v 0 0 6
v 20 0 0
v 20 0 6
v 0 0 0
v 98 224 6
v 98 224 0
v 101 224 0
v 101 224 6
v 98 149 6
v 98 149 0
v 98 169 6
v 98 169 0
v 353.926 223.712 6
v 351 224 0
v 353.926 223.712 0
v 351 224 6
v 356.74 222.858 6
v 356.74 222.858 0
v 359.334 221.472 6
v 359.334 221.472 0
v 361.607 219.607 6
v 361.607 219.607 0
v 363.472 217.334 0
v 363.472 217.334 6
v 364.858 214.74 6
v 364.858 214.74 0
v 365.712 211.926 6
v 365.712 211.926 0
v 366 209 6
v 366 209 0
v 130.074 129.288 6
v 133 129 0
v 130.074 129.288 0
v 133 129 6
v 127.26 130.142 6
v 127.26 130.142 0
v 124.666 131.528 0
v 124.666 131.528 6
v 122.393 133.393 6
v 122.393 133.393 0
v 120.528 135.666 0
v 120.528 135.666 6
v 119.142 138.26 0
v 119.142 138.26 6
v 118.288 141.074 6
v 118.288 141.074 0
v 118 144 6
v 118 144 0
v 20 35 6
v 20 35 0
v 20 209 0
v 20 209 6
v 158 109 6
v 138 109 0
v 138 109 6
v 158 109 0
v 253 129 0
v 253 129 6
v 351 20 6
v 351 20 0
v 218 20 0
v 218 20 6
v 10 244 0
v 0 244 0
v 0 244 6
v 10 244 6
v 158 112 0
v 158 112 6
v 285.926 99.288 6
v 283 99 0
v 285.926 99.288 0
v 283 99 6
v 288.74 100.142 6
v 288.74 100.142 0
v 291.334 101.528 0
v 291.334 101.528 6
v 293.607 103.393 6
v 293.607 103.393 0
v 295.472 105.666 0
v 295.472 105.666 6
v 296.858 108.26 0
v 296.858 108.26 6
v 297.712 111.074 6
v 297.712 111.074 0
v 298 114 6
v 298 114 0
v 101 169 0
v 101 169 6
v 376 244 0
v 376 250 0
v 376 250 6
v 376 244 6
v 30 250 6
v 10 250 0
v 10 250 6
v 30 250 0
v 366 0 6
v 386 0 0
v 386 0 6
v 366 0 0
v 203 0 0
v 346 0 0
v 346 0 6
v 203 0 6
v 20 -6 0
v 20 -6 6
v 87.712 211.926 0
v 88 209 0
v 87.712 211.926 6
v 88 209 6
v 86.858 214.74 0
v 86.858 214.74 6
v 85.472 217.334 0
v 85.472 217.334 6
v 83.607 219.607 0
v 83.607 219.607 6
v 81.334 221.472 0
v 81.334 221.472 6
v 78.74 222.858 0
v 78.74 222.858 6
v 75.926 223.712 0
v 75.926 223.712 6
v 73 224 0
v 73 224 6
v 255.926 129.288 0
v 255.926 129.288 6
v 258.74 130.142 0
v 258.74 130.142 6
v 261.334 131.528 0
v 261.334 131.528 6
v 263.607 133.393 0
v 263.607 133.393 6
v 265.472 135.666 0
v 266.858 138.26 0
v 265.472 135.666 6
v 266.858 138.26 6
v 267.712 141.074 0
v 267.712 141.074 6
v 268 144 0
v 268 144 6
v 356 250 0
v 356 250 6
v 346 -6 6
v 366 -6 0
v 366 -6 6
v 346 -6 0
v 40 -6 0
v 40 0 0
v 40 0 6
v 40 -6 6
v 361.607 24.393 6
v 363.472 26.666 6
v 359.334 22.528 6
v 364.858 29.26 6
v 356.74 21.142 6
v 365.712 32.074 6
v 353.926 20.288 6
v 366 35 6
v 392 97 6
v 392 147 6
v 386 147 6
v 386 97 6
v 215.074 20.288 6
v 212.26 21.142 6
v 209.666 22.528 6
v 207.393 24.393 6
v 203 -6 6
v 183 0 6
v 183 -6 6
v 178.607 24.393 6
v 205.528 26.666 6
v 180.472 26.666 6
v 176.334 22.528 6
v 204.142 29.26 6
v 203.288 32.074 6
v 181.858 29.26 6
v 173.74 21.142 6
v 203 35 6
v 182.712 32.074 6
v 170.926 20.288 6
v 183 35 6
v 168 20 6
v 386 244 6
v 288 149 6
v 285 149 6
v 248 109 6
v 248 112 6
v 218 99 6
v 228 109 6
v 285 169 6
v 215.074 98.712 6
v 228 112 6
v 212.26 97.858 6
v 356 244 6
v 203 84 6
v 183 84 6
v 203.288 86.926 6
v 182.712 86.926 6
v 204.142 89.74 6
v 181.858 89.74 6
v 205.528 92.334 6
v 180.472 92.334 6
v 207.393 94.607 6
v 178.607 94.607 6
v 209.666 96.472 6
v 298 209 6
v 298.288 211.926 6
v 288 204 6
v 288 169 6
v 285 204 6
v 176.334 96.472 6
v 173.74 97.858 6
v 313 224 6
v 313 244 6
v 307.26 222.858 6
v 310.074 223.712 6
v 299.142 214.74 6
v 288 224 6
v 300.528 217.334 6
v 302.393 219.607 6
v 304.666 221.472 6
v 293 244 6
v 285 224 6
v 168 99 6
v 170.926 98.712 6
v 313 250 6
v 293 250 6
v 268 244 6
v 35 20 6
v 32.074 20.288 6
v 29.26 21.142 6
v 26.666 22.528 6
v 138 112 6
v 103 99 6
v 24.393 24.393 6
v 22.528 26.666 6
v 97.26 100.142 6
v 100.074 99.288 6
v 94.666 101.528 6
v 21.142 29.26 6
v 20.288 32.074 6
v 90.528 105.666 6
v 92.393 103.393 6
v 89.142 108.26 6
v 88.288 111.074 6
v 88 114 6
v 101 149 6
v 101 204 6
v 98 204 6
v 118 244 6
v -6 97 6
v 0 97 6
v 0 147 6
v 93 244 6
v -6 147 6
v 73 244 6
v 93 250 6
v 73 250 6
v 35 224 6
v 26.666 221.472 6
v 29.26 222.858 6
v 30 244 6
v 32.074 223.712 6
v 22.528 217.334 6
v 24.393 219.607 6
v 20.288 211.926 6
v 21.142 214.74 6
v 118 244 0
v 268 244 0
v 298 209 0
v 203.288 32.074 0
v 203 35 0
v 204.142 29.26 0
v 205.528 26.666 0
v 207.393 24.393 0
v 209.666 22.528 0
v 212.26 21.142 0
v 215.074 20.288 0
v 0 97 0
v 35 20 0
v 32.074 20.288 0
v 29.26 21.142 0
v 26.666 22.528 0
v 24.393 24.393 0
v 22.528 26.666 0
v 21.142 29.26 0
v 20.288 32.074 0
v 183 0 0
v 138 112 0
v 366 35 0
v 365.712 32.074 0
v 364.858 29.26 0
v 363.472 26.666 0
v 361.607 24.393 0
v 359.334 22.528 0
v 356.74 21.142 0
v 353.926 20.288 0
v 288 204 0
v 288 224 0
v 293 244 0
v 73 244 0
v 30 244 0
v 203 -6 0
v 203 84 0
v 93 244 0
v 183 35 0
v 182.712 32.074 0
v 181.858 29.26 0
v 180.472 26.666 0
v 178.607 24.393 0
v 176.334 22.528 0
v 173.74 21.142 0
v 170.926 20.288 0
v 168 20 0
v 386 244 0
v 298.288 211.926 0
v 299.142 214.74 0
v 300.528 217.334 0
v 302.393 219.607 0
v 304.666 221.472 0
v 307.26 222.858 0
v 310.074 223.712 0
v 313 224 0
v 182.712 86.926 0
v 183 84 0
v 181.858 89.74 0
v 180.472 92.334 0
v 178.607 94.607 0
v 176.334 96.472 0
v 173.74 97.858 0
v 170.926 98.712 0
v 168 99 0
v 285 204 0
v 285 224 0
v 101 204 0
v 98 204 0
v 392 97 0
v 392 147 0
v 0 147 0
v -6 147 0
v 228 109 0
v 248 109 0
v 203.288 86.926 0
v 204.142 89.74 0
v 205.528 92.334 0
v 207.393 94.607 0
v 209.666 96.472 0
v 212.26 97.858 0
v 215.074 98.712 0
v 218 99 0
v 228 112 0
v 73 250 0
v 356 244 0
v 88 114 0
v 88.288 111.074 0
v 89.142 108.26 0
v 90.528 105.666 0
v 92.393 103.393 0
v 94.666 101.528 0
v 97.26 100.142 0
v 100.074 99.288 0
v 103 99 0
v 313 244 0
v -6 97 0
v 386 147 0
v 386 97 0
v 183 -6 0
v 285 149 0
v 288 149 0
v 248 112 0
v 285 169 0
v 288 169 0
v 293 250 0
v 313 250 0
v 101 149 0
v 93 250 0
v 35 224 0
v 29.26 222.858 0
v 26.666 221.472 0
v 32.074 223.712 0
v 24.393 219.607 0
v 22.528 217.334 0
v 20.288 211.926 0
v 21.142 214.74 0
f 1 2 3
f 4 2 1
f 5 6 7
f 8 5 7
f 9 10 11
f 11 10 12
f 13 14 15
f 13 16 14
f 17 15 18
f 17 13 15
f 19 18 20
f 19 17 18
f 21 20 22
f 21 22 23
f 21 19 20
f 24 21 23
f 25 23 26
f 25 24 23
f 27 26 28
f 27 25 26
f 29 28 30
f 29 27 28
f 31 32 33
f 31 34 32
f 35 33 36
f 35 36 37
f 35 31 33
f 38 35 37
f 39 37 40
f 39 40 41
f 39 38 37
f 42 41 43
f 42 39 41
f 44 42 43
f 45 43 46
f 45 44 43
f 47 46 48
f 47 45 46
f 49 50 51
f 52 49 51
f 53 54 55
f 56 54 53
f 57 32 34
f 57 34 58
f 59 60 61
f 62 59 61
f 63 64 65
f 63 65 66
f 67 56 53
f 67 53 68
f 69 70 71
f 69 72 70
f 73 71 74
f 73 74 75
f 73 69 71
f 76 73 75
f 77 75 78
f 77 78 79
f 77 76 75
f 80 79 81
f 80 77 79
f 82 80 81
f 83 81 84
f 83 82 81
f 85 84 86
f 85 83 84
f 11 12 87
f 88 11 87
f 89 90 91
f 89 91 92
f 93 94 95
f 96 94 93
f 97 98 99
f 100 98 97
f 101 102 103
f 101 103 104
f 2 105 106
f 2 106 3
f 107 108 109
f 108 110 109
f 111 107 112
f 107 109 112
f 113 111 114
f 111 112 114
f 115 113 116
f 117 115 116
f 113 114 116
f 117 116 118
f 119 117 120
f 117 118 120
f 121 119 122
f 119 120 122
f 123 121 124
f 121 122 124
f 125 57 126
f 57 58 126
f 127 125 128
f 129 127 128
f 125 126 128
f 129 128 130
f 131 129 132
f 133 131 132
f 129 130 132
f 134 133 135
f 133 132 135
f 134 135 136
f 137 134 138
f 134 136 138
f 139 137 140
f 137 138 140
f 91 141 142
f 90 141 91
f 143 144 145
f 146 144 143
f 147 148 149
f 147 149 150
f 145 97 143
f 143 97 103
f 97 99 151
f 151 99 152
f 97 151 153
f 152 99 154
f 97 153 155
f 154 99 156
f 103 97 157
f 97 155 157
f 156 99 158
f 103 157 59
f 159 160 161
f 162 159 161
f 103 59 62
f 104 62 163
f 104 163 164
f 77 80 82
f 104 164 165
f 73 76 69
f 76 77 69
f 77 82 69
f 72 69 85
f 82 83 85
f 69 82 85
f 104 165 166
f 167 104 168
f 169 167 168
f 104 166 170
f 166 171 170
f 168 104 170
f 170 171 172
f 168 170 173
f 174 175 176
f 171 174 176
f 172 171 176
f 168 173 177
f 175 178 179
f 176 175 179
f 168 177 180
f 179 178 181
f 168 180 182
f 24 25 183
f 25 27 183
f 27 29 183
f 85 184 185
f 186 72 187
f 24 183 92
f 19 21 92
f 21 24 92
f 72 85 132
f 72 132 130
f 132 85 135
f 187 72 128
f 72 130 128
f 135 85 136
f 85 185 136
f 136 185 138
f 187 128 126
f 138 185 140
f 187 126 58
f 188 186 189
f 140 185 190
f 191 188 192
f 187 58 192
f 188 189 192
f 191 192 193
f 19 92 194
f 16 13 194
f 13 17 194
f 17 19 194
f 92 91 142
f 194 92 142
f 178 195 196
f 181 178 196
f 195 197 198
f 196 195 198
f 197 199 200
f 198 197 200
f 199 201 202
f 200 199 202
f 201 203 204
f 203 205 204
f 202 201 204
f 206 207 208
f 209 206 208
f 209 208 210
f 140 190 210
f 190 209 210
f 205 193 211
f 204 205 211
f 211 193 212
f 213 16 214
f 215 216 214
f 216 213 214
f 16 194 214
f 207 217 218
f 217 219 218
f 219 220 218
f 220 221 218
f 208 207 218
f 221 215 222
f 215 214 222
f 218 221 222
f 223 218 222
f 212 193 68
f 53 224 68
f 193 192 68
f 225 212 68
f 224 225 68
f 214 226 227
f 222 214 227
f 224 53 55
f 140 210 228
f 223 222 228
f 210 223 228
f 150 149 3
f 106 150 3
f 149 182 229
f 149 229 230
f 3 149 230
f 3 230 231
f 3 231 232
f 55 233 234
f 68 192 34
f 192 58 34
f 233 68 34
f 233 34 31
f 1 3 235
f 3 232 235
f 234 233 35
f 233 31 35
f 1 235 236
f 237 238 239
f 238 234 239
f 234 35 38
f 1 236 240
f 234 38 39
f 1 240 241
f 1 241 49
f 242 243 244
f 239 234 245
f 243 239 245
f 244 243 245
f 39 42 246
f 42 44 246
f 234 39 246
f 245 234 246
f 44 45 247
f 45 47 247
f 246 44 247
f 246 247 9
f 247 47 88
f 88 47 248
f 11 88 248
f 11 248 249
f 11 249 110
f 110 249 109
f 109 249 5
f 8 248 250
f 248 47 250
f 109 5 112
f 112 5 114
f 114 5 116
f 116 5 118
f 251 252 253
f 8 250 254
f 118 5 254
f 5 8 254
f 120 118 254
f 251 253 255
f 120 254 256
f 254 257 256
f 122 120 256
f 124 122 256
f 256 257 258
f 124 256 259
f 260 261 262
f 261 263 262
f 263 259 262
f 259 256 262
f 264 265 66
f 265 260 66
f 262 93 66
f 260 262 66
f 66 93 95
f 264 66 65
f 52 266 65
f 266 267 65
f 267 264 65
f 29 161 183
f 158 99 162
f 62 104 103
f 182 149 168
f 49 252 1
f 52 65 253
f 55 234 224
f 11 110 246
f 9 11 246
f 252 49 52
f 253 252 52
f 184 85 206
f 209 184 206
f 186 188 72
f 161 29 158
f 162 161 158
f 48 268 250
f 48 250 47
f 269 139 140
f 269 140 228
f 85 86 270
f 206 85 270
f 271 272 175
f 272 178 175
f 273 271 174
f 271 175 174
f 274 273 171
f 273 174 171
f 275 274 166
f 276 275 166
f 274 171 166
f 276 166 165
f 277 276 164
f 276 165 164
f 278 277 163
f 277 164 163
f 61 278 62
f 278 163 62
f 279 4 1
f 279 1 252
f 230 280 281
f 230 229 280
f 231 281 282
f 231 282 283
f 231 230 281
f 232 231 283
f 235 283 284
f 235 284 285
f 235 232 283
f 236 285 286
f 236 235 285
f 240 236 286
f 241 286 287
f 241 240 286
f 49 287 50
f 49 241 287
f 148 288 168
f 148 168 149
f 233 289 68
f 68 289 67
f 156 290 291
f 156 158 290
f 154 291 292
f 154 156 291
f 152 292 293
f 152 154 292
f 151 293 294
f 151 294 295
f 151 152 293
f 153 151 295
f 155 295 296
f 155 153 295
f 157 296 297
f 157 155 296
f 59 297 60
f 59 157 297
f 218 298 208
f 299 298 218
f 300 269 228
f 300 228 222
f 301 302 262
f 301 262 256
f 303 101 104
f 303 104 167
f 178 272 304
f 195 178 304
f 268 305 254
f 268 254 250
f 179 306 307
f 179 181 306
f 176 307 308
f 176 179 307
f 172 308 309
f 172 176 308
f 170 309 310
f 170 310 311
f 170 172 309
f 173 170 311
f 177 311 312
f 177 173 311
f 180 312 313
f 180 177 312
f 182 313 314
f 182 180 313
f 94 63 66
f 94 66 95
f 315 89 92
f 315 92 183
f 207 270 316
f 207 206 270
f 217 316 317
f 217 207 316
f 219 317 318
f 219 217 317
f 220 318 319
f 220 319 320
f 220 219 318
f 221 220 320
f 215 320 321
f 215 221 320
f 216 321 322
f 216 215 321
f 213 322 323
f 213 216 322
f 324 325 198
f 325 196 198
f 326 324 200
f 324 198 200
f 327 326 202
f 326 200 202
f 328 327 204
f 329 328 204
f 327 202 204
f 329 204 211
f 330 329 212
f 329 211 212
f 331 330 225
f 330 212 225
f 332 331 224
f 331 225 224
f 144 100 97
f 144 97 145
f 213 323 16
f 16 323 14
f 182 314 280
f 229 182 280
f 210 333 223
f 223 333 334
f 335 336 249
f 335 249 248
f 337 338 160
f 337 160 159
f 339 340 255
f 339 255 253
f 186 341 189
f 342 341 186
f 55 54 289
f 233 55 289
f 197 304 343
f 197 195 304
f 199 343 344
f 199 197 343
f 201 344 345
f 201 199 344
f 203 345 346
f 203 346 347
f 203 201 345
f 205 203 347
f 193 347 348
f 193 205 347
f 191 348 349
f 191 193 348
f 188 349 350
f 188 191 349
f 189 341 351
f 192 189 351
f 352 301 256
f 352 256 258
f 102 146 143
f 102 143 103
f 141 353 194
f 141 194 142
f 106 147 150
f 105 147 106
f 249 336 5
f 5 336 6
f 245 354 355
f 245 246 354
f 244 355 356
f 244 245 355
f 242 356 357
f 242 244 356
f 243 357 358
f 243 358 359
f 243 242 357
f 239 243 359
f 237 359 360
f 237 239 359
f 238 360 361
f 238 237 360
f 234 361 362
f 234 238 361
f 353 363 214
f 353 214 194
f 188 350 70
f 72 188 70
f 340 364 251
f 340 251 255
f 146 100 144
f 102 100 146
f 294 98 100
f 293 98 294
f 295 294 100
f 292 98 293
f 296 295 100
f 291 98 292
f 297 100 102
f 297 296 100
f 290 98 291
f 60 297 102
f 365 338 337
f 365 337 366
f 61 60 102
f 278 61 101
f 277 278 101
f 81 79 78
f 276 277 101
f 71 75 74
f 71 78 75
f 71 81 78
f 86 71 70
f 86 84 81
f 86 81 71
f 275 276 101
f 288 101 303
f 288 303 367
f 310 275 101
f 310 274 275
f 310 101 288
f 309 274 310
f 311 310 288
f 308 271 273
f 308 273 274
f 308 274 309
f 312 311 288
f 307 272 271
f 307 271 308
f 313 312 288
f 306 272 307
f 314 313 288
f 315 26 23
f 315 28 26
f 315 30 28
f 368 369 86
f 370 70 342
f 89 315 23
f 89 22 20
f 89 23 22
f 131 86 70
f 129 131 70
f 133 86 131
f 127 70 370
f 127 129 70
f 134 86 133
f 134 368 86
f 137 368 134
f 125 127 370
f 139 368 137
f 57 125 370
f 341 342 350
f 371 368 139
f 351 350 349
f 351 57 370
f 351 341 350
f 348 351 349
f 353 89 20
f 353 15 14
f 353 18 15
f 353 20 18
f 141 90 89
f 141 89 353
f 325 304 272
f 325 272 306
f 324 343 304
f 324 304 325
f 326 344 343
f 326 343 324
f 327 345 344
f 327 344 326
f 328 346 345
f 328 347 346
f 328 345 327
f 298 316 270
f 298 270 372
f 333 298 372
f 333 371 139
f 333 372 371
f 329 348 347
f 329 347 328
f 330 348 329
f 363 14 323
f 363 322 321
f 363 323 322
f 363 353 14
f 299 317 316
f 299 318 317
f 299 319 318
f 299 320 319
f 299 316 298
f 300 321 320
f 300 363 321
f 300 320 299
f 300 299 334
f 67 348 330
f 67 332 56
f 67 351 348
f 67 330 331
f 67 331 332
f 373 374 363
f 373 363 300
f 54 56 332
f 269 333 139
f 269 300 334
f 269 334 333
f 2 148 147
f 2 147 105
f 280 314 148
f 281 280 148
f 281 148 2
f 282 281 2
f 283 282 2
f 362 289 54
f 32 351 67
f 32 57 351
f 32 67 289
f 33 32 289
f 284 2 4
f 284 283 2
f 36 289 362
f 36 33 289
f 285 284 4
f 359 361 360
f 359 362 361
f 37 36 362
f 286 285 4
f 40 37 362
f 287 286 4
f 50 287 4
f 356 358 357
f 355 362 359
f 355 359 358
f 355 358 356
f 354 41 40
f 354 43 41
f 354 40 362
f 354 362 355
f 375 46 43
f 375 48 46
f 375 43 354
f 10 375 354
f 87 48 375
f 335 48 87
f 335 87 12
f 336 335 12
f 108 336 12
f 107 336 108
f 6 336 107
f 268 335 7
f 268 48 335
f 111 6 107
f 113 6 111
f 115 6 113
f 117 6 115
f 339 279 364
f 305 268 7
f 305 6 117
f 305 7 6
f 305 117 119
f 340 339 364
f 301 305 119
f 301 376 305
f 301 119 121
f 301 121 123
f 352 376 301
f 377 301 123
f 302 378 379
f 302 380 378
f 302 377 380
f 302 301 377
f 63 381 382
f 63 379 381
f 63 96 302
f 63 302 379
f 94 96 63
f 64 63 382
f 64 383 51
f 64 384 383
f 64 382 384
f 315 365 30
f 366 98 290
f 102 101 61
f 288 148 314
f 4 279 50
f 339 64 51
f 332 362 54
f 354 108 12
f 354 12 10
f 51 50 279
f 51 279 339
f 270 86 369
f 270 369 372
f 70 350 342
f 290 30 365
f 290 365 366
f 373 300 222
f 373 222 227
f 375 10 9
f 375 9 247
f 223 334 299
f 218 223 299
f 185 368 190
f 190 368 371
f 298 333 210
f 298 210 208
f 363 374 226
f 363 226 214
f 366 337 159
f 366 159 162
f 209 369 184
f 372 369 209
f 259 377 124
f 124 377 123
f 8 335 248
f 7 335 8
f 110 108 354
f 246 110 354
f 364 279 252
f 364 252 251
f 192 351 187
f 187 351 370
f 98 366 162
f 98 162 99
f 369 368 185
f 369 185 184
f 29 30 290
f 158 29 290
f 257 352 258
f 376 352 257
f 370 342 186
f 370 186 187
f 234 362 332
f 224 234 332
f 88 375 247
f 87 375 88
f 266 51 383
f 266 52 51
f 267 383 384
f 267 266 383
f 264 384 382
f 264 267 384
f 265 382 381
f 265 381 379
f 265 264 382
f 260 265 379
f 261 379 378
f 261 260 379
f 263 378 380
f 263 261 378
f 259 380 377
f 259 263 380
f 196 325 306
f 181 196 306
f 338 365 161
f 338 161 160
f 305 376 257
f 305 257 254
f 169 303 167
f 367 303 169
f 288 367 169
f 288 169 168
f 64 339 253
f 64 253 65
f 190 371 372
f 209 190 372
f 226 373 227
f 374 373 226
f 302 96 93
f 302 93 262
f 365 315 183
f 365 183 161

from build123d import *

# Parameters (mm, degrees)
SKETCH_1_W      = 3
SKETCH_1_H      = 20
SKETCH_1_W_2    = 20
SKETCH_1_H_2    = 3
EXTRUDE_1_DEPTH = 6
FILLET_2_R      = 15
FILLET_3_R      = 15
FILLET_4_R      = 15
FILLET_5_R      = 15
FILLET_6_R      = 15
FILLET_7_R      = 15
FILLET_8_R      = 15
FILLET_9_R      = 15
FILLET_10_R     = 15
FILLET_11_R     = 15
FILLET_12_R     = 15
FILLET_13_R     = 15
FILLET_14_R     = 15
FILLET_15_R     = 15


with BuildPart() as part:
    # Эскиз1 → Бобышка-Вытянуть1 (new body)
    with BuildSketch(Plane.XY):
        Polygon((118, 244), (118, 129), (268, 129), (268, 244), (293, 244), (293, 250), (313, 250), (313, 244), (356, 244), (356, 250), (376, 250), (376, 244), (386, 244), (386, 147), (392, 147), (392, 97), (386, 97), (386, 0), (366, 0), (366, -6), (346, -6), (346, 0), (203, 0), (203, -6), (183, -6), (183, 0), (40, 0), (40, -6), (20, -6), (20, 0), (0, 0), (0, 97), (-6, 97), (-6, 147), (0, 147), (0, 244), (10, 244), (10, 250), (30, 250), (30, 244), (73, 244), (73, 250), (93, 250), (93, 244), align=None)
        Polygon((20, 20), (20, 224), (88, 224), (88, 99), (183, 99), (183, 20), align=None, mode=Mode.SUBTRACT)
        Polygon((298, 99), (298, 224), (366, 224), (366, 20), (203, 20), (203, 99), align=None, mode=Mode.SUBTRACT)
        with Locations((99.5, 214)):
            Rectangle(SKETCH_1_W, SKETCH_1_H, mode=Mode.SUBTRACT)
        with Locations((99.5, 159)):
            Rectangle(SKETCH_1_W, SKETCH_1_H, mode=Mode.SUBTRACT)
        with Locations((148, 110.5)):
            Rectangle(SKETCH_1_W_2, SKETCH_1_H_2, mode=Mode.SUBTRACT)
        with Locations((238, 110.5)):
            Rectangle(SKETCH_1_W_2, SKETCH_1_H_2, mode=Mode.SUBTRACT)
        with Locations((286.5, 214)):
            Rectangle(SKETCH_1_W, SKETCH_1_H, mode=Mode.SUBTRACT)
        with Locations((286.5, 159)):
            Rectangle(SKETCH_1_W, SKETCH_1_H, mode=Mode.SUBTRACT)
    extrude(amount=EXTRUDE_1_DEPTH)

    # Скругление2
    fillet_2_edges = [part.edges().sort_by_distance(p)[0] for p in [
        (366, 20, 3),
    ]]
    fillet(fillet_2_edges, radius=FILLET_2_R)

    # Скругление3
    fillet_3_edges = [part.edges().sort_by_distance(p)[0] for p in [
        (203, 99, 3),
    ]]
    fillet(fillet_3_edges, radius=FILLET_3_R)

    # Скругление4
    fillet_4_edges = [part.edges().sort_by_distance(p)[0] for p in [
        (203, 20, 3),
    ]]
    fillet(fillet_4_edges, radius=FILLET_4_R)

    # Скругление5
    fillet_5_edges = [part.edges().sort_by_distance(p)[0] for p in [
        (298, 99, 3),
    ]]
    fillet(fillet_5_edges, radius=FILLET_5_R)

    # Скругление6
    fillet_6_edges = [part.edges().sort_by_distance(p)[0] for p in [
        (298, 224, 3),
    ]]
    fillet(fillet_6_edges, radius=FILLET_6_R)

    # Скругление7
    fillet_7_edges = [part.edges().sort_by_distance(p)[0] for p in [
        (366, 224, 3),
    ]]
    fillet(fillet_7_edges, radius=FILLET_7_R)

    # Скругление8
    fillet_8_edges = [part.edges().sort_by_distance(p)[0] for p in [
        (183, 99, 3),
    ]]
    fillet(fillet_8_edges, radius=FILLET_8_R)

    # Скругление9
    fillet_9_edges = [part.edges().sort_by_distance(p)[0] for p in [
        (20, 224, 3),
    ]]
    fillet(fillet_9_edges, radius=FILLET_9_R)

    # Скругление10
    fillet_10_edges = [part.edges().sort_by_distance(p)[0] for p in [
        (88, 99, 3),
    ]]
    fillet(fillet_10_edges, radius=FILLET_10_R)

    # Скругление11
    fillet_11_edges = [part.edges().sort_by_distance(p)[0] for p in [
        (88, 224, 3),
    ]]
    fillet(fillet_11_edges, radius=FILLET_11_R)

    # Скругление12
    fillet_12_edges = [part.edges().sort_by_distance(p)[0] for p in [
        (183, 20, 3),
    ]]
    fillet(fillet_12_edges, radius=FILLET_12_R)

    # Скругление13
    fillet_13_edges = [part.edges().sort_by_distance(p)[0] for p in [
        (20, 20, 3),
    ]]
    fillet(fillet_13_edges, radius=FILLET_13_R)

    # Скругление14
    fillet_14_edges = [part.edges().sort_by_distance(p)[0] for p in [
        (268, 129, 3),
    ]]
    fillet(fillet_14_edges, radius=FILLET_14_R)

    # Скругление15
    fillet_15_edges = [part.edges().sort_by_distance(p)[0] for p in [
        (118, 129, 3),
    ]]
    fillet(fillet_15_edges, radius=FILLET_15_R)


solid = part.part
